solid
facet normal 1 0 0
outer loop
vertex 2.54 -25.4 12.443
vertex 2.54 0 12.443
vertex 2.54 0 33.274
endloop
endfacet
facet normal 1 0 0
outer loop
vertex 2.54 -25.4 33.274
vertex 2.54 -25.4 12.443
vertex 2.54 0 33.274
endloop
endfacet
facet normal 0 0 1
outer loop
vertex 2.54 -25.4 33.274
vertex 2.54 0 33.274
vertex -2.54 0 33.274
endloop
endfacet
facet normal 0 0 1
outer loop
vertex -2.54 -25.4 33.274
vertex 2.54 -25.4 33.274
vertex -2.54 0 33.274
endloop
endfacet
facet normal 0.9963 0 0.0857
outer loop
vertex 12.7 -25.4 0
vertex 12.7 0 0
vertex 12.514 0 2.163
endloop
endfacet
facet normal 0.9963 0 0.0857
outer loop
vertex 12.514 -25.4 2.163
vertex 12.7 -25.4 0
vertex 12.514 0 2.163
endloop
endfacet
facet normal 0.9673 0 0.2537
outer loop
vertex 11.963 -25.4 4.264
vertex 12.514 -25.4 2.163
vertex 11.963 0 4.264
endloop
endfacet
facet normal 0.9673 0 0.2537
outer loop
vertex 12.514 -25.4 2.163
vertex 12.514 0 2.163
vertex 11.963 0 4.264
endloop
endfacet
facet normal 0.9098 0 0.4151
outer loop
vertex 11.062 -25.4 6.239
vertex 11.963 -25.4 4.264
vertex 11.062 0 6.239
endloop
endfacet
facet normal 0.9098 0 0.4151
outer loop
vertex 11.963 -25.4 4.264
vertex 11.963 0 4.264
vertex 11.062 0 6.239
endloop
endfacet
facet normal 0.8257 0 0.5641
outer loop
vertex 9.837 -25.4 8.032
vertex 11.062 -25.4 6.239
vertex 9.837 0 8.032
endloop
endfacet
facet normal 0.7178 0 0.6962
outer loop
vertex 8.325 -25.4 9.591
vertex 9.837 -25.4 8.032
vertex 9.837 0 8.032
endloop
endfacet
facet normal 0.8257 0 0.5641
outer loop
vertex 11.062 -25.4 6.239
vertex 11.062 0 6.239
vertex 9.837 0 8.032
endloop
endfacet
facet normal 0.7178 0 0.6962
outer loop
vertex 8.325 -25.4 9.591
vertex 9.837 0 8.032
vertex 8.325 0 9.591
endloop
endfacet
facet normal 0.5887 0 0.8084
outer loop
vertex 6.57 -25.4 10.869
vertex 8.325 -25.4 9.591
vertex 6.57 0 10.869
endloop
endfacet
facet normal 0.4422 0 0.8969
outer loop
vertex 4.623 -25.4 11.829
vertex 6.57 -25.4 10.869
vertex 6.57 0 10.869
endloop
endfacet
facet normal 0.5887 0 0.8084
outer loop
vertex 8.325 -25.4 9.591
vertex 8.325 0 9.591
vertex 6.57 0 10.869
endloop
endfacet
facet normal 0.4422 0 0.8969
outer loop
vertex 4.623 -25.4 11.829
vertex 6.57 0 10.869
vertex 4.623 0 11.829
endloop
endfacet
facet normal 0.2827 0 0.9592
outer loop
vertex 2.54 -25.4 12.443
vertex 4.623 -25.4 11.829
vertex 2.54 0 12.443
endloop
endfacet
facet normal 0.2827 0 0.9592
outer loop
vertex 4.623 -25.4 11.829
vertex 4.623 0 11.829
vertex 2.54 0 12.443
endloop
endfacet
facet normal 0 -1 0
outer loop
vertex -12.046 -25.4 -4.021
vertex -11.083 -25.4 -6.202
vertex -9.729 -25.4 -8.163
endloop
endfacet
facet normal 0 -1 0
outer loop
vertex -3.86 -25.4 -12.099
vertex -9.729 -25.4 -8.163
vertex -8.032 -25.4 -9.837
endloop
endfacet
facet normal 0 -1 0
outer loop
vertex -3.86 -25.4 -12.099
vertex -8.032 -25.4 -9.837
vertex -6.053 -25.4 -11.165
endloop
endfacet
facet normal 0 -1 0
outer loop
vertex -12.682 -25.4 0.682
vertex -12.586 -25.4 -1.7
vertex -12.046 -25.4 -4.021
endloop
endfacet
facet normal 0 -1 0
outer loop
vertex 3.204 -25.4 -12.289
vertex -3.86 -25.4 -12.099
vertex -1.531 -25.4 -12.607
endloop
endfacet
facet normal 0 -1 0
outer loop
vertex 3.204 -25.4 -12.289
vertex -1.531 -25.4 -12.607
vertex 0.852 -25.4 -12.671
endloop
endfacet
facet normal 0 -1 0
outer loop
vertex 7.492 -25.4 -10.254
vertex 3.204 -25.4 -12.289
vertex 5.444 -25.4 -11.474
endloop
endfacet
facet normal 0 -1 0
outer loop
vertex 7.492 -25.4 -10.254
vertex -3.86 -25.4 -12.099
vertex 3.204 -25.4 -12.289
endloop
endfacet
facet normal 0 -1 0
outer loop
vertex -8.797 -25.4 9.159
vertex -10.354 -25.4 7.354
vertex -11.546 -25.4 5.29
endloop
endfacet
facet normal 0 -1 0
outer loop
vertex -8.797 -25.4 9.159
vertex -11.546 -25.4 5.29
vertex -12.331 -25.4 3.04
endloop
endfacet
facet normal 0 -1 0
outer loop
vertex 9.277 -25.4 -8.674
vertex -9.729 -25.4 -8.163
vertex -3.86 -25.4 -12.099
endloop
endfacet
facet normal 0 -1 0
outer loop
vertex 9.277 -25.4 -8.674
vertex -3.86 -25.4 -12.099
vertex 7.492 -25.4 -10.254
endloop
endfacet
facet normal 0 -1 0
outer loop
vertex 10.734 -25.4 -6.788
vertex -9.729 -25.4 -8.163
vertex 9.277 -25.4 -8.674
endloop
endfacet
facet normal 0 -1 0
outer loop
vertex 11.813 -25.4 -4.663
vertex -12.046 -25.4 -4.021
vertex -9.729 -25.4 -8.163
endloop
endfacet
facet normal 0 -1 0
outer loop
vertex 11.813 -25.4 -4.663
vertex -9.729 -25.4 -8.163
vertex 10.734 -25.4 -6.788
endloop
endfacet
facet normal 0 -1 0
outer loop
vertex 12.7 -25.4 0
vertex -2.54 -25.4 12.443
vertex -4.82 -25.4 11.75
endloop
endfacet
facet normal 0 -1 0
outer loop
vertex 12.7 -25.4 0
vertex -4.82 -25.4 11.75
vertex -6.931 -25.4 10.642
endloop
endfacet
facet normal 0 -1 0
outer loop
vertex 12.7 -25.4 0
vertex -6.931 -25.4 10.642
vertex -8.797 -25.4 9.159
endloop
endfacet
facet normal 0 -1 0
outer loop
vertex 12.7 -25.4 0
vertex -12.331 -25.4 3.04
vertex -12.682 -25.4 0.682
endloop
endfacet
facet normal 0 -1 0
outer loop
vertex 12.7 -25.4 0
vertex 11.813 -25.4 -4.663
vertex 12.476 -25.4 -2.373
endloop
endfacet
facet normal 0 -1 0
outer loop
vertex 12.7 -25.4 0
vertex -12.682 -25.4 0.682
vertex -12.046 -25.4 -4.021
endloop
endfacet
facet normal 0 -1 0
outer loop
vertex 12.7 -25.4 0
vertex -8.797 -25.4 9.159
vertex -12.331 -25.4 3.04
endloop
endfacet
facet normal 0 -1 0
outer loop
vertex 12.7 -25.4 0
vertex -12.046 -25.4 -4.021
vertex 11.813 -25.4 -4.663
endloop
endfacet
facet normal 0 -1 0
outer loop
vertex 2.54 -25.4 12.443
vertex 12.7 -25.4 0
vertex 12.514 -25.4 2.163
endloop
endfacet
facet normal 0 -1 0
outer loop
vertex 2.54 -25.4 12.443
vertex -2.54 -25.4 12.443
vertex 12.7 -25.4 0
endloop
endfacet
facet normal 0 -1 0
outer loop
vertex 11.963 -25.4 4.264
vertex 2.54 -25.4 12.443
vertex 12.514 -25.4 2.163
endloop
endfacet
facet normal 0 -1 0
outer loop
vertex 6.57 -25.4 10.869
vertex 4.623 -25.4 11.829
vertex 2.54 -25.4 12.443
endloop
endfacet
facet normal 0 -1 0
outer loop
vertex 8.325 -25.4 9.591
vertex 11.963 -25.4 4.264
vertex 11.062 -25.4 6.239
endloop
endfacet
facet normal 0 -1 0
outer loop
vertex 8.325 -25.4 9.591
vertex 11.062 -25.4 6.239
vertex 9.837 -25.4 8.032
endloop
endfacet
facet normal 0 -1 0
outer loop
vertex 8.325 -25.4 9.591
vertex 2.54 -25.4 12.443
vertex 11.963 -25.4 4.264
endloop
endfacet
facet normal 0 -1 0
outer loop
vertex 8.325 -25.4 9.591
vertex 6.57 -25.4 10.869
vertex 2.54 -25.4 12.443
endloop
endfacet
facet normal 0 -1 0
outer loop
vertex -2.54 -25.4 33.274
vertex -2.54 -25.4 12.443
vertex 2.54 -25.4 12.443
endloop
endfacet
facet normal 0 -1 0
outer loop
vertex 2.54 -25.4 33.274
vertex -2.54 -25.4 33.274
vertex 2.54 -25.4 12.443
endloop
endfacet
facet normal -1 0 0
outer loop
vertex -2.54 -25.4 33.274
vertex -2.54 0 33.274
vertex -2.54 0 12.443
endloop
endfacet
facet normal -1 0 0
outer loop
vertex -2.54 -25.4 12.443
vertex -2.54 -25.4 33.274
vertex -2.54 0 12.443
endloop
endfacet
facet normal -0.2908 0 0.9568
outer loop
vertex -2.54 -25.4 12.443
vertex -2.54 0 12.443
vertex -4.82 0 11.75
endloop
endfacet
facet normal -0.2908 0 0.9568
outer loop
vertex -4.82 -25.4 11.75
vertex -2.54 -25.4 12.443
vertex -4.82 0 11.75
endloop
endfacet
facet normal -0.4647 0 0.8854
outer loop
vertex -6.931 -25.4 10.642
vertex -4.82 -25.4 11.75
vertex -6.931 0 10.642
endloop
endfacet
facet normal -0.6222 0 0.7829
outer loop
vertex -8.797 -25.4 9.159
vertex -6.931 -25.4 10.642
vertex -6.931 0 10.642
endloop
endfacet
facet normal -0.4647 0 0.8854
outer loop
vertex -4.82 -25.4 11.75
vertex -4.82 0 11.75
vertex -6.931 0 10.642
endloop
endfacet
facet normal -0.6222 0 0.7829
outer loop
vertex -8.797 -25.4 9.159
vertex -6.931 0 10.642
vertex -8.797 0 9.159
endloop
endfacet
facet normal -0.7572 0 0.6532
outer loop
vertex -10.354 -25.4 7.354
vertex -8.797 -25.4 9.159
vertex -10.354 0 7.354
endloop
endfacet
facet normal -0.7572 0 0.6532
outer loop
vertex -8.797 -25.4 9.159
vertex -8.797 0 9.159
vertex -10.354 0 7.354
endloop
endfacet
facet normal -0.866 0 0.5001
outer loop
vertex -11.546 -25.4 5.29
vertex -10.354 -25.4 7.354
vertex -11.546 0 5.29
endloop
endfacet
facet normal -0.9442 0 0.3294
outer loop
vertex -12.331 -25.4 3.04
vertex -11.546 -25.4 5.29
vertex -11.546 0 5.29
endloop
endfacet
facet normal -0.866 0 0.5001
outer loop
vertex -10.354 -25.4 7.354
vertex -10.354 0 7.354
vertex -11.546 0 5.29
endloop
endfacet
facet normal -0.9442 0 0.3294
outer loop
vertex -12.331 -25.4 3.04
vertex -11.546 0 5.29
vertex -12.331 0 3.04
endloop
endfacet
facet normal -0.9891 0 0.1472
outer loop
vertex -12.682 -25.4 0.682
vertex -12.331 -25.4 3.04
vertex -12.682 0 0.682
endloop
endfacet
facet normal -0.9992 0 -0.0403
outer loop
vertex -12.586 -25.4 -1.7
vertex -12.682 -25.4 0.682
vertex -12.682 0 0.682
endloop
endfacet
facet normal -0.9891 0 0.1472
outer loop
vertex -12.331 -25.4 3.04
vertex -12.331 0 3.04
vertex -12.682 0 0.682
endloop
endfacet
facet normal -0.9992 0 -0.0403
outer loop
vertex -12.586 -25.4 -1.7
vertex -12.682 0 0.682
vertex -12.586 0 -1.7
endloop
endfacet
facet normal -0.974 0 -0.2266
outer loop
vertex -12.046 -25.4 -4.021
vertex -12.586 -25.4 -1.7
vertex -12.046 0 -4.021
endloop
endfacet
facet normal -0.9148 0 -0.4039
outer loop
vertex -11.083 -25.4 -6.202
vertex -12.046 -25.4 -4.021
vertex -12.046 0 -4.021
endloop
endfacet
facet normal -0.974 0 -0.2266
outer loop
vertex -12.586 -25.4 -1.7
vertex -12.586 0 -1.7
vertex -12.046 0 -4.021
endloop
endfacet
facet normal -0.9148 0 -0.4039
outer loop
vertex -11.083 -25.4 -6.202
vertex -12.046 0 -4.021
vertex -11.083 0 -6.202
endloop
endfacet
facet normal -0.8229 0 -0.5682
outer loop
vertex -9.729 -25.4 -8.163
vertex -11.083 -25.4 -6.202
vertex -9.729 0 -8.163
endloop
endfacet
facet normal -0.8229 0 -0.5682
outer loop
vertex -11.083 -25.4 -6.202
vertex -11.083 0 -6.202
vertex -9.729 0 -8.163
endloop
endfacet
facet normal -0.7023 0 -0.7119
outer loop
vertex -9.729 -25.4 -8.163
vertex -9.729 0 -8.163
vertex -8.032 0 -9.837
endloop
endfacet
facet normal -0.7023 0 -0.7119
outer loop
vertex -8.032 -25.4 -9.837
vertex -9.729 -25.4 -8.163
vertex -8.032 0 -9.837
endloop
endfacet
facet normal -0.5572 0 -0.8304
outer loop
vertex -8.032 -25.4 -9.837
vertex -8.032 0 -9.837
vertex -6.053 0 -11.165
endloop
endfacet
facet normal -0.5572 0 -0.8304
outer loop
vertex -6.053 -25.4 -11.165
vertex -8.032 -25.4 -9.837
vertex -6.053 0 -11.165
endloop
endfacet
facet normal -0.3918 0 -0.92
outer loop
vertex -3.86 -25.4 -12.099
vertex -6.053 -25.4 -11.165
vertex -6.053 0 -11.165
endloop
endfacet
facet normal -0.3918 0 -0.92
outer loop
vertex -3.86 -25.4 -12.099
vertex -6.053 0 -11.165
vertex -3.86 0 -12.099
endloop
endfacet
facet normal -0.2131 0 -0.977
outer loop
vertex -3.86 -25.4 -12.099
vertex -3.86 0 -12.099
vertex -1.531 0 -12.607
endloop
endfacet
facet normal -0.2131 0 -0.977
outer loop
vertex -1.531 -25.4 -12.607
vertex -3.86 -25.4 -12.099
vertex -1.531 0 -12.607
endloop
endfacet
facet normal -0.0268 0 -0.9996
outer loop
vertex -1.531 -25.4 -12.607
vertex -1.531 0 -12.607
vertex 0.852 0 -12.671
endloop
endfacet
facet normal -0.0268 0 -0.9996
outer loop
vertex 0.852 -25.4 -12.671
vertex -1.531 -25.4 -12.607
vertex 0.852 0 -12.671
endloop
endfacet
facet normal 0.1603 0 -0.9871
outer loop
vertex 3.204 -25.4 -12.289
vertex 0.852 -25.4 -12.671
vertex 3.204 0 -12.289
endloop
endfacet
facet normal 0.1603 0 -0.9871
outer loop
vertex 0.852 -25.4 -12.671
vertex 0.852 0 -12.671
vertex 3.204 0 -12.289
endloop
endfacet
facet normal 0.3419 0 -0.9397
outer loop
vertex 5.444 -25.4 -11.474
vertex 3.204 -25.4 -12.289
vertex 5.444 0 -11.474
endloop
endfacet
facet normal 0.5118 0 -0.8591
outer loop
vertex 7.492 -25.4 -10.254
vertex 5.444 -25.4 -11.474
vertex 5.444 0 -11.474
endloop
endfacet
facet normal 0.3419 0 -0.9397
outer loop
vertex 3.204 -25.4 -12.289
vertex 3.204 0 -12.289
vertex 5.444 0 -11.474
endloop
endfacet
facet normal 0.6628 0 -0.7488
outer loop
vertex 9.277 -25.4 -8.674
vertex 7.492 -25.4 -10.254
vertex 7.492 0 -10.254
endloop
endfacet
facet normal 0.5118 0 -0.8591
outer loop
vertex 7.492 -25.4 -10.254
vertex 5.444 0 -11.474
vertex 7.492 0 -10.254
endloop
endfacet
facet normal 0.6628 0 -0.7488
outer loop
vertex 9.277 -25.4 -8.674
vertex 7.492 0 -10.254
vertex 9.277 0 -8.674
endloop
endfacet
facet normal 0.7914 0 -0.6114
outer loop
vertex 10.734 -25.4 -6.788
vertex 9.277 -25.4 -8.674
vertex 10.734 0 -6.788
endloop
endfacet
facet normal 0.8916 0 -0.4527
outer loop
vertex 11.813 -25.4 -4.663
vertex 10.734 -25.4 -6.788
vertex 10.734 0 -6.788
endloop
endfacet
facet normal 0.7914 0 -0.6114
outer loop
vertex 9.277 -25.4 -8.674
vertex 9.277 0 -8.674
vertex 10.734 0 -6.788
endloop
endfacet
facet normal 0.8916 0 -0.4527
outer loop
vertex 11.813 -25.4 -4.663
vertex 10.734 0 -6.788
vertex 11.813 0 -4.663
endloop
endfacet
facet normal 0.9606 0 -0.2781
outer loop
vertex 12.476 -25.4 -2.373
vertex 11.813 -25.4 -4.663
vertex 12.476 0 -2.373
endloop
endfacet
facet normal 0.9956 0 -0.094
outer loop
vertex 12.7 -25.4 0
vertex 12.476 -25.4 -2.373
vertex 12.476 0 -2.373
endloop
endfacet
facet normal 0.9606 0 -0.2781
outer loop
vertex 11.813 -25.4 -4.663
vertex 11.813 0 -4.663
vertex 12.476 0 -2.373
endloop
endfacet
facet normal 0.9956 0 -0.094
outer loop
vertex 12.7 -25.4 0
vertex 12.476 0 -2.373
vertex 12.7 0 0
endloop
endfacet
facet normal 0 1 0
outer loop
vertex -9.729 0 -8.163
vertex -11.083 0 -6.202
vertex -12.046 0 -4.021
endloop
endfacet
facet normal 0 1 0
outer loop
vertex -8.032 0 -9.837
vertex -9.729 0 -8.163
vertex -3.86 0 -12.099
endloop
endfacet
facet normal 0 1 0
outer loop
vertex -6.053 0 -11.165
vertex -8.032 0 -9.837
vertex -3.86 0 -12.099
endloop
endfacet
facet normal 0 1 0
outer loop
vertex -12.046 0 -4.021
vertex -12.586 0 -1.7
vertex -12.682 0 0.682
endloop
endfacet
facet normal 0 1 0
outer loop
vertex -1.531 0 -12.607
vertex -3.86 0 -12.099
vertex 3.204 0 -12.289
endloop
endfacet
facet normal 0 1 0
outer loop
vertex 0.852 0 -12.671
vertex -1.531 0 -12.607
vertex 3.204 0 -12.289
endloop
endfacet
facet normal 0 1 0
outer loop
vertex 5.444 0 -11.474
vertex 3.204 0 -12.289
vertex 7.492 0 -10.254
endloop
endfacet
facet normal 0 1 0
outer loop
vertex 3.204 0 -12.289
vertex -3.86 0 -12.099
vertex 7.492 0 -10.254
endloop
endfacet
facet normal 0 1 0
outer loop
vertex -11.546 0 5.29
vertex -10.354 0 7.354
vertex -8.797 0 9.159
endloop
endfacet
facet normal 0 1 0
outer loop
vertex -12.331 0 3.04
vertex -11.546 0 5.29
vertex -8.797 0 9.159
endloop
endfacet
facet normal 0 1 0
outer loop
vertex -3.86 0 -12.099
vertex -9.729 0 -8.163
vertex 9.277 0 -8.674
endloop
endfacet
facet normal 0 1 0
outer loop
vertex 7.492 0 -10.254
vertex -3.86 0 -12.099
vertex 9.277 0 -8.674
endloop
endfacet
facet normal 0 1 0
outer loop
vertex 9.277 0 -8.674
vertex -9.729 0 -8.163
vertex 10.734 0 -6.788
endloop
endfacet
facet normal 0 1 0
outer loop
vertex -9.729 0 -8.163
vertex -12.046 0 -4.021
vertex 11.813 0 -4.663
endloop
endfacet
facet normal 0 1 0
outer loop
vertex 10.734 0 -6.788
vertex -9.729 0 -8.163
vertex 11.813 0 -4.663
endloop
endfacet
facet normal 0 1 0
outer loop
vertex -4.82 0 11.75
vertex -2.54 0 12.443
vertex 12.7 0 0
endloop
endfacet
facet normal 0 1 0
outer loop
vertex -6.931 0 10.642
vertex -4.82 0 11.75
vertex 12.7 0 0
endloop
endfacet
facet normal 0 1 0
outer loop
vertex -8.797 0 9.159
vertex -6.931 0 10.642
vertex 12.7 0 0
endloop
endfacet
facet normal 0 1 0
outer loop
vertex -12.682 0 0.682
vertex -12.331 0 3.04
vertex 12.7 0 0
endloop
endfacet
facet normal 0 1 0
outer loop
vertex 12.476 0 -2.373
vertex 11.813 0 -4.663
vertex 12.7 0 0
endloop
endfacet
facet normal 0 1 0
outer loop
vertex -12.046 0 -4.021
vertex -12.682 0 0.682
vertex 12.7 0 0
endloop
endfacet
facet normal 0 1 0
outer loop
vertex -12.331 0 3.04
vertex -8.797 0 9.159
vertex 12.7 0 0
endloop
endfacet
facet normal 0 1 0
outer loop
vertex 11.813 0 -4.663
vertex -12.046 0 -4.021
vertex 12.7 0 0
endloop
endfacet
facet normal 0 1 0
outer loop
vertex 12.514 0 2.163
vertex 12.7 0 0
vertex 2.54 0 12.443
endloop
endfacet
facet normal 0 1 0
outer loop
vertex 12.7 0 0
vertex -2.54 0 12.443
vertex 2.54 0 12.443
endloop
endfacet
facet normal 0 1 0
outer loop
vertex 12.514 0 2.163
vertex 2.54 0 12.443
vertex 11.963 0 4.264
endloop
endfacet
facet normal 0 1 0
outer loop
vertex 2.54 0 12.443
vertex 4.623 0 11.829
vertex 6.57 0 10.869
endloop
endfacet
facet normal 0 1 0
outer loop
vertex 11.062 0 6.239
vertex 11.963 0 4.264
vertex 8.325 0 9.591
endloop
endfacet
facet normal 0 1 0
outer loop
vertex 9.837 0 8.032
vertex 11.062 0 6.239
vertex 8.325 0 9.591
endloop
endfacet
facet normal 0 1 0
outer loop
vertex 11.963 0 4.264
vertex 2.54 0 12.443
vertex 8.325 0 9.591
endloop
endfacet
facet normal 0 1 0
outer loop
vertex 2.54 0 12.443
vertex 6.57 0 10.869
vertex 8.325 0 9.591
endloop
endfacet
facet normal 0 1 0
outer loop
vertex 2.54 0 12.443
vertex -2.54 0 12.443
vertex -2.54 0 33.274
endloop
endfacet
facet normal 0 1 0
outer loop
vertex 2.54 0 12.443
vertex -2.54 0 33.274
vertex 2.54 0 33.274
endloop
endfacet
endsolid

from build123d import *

# Parameters (mm, degrees)
F1_DEPTH = 25.4
F2_DEPTH = 25.4


with BuildPart() as f1:
    # F0 (on Front) → F1 (new body)
    with BuildSketch(Plane.XZ):
        with BuildLine():
            ThreePointArc((-2.54, 12.443408), (-8.032185, -9.837378), (12.7, 0))
            ThreePointArc((12.7, 0), (9.837378, 8.032185), (2.54, 12.443408))
            Line((2.54, 12.443408), (2.54, 0))
            Line((2.54, 0), (-2.54, 0))
            Line((-2.54, 0), (-2.54, 12.443408))
        make_face()
    extrude(amount=F1_DEPTH)

    # F0 (on Front) → F2 (join, through all)
    with BuildSketch(Plane.XZ):
        with BuildLine():
            ThreePointArc((-2.54, 12.443408), (0, 12.7), (2.54, 12.443408))
            Line((2.54, 12.443408), (2.54, 33.27414))
            Line((2.54, 33.27414), (-2.54, 33.27414))
            Line((-2.54, 33.27414), (-2.54, 12.443408))
        make_face()
        with BuildLine():
            Line((2.54, 0), (2.54, 12.443408))
            ThreePointArc((2.54, 12.443408), (0, 12.7), (-2.54, 12.443408))
            Line((-2.54, 12.443408), (-2.54, 0))
            Line((-2.54, 0), (2.54, 0))
        make_face()
    extrude(amount=F2_DEPTH)


solid = f1.part
